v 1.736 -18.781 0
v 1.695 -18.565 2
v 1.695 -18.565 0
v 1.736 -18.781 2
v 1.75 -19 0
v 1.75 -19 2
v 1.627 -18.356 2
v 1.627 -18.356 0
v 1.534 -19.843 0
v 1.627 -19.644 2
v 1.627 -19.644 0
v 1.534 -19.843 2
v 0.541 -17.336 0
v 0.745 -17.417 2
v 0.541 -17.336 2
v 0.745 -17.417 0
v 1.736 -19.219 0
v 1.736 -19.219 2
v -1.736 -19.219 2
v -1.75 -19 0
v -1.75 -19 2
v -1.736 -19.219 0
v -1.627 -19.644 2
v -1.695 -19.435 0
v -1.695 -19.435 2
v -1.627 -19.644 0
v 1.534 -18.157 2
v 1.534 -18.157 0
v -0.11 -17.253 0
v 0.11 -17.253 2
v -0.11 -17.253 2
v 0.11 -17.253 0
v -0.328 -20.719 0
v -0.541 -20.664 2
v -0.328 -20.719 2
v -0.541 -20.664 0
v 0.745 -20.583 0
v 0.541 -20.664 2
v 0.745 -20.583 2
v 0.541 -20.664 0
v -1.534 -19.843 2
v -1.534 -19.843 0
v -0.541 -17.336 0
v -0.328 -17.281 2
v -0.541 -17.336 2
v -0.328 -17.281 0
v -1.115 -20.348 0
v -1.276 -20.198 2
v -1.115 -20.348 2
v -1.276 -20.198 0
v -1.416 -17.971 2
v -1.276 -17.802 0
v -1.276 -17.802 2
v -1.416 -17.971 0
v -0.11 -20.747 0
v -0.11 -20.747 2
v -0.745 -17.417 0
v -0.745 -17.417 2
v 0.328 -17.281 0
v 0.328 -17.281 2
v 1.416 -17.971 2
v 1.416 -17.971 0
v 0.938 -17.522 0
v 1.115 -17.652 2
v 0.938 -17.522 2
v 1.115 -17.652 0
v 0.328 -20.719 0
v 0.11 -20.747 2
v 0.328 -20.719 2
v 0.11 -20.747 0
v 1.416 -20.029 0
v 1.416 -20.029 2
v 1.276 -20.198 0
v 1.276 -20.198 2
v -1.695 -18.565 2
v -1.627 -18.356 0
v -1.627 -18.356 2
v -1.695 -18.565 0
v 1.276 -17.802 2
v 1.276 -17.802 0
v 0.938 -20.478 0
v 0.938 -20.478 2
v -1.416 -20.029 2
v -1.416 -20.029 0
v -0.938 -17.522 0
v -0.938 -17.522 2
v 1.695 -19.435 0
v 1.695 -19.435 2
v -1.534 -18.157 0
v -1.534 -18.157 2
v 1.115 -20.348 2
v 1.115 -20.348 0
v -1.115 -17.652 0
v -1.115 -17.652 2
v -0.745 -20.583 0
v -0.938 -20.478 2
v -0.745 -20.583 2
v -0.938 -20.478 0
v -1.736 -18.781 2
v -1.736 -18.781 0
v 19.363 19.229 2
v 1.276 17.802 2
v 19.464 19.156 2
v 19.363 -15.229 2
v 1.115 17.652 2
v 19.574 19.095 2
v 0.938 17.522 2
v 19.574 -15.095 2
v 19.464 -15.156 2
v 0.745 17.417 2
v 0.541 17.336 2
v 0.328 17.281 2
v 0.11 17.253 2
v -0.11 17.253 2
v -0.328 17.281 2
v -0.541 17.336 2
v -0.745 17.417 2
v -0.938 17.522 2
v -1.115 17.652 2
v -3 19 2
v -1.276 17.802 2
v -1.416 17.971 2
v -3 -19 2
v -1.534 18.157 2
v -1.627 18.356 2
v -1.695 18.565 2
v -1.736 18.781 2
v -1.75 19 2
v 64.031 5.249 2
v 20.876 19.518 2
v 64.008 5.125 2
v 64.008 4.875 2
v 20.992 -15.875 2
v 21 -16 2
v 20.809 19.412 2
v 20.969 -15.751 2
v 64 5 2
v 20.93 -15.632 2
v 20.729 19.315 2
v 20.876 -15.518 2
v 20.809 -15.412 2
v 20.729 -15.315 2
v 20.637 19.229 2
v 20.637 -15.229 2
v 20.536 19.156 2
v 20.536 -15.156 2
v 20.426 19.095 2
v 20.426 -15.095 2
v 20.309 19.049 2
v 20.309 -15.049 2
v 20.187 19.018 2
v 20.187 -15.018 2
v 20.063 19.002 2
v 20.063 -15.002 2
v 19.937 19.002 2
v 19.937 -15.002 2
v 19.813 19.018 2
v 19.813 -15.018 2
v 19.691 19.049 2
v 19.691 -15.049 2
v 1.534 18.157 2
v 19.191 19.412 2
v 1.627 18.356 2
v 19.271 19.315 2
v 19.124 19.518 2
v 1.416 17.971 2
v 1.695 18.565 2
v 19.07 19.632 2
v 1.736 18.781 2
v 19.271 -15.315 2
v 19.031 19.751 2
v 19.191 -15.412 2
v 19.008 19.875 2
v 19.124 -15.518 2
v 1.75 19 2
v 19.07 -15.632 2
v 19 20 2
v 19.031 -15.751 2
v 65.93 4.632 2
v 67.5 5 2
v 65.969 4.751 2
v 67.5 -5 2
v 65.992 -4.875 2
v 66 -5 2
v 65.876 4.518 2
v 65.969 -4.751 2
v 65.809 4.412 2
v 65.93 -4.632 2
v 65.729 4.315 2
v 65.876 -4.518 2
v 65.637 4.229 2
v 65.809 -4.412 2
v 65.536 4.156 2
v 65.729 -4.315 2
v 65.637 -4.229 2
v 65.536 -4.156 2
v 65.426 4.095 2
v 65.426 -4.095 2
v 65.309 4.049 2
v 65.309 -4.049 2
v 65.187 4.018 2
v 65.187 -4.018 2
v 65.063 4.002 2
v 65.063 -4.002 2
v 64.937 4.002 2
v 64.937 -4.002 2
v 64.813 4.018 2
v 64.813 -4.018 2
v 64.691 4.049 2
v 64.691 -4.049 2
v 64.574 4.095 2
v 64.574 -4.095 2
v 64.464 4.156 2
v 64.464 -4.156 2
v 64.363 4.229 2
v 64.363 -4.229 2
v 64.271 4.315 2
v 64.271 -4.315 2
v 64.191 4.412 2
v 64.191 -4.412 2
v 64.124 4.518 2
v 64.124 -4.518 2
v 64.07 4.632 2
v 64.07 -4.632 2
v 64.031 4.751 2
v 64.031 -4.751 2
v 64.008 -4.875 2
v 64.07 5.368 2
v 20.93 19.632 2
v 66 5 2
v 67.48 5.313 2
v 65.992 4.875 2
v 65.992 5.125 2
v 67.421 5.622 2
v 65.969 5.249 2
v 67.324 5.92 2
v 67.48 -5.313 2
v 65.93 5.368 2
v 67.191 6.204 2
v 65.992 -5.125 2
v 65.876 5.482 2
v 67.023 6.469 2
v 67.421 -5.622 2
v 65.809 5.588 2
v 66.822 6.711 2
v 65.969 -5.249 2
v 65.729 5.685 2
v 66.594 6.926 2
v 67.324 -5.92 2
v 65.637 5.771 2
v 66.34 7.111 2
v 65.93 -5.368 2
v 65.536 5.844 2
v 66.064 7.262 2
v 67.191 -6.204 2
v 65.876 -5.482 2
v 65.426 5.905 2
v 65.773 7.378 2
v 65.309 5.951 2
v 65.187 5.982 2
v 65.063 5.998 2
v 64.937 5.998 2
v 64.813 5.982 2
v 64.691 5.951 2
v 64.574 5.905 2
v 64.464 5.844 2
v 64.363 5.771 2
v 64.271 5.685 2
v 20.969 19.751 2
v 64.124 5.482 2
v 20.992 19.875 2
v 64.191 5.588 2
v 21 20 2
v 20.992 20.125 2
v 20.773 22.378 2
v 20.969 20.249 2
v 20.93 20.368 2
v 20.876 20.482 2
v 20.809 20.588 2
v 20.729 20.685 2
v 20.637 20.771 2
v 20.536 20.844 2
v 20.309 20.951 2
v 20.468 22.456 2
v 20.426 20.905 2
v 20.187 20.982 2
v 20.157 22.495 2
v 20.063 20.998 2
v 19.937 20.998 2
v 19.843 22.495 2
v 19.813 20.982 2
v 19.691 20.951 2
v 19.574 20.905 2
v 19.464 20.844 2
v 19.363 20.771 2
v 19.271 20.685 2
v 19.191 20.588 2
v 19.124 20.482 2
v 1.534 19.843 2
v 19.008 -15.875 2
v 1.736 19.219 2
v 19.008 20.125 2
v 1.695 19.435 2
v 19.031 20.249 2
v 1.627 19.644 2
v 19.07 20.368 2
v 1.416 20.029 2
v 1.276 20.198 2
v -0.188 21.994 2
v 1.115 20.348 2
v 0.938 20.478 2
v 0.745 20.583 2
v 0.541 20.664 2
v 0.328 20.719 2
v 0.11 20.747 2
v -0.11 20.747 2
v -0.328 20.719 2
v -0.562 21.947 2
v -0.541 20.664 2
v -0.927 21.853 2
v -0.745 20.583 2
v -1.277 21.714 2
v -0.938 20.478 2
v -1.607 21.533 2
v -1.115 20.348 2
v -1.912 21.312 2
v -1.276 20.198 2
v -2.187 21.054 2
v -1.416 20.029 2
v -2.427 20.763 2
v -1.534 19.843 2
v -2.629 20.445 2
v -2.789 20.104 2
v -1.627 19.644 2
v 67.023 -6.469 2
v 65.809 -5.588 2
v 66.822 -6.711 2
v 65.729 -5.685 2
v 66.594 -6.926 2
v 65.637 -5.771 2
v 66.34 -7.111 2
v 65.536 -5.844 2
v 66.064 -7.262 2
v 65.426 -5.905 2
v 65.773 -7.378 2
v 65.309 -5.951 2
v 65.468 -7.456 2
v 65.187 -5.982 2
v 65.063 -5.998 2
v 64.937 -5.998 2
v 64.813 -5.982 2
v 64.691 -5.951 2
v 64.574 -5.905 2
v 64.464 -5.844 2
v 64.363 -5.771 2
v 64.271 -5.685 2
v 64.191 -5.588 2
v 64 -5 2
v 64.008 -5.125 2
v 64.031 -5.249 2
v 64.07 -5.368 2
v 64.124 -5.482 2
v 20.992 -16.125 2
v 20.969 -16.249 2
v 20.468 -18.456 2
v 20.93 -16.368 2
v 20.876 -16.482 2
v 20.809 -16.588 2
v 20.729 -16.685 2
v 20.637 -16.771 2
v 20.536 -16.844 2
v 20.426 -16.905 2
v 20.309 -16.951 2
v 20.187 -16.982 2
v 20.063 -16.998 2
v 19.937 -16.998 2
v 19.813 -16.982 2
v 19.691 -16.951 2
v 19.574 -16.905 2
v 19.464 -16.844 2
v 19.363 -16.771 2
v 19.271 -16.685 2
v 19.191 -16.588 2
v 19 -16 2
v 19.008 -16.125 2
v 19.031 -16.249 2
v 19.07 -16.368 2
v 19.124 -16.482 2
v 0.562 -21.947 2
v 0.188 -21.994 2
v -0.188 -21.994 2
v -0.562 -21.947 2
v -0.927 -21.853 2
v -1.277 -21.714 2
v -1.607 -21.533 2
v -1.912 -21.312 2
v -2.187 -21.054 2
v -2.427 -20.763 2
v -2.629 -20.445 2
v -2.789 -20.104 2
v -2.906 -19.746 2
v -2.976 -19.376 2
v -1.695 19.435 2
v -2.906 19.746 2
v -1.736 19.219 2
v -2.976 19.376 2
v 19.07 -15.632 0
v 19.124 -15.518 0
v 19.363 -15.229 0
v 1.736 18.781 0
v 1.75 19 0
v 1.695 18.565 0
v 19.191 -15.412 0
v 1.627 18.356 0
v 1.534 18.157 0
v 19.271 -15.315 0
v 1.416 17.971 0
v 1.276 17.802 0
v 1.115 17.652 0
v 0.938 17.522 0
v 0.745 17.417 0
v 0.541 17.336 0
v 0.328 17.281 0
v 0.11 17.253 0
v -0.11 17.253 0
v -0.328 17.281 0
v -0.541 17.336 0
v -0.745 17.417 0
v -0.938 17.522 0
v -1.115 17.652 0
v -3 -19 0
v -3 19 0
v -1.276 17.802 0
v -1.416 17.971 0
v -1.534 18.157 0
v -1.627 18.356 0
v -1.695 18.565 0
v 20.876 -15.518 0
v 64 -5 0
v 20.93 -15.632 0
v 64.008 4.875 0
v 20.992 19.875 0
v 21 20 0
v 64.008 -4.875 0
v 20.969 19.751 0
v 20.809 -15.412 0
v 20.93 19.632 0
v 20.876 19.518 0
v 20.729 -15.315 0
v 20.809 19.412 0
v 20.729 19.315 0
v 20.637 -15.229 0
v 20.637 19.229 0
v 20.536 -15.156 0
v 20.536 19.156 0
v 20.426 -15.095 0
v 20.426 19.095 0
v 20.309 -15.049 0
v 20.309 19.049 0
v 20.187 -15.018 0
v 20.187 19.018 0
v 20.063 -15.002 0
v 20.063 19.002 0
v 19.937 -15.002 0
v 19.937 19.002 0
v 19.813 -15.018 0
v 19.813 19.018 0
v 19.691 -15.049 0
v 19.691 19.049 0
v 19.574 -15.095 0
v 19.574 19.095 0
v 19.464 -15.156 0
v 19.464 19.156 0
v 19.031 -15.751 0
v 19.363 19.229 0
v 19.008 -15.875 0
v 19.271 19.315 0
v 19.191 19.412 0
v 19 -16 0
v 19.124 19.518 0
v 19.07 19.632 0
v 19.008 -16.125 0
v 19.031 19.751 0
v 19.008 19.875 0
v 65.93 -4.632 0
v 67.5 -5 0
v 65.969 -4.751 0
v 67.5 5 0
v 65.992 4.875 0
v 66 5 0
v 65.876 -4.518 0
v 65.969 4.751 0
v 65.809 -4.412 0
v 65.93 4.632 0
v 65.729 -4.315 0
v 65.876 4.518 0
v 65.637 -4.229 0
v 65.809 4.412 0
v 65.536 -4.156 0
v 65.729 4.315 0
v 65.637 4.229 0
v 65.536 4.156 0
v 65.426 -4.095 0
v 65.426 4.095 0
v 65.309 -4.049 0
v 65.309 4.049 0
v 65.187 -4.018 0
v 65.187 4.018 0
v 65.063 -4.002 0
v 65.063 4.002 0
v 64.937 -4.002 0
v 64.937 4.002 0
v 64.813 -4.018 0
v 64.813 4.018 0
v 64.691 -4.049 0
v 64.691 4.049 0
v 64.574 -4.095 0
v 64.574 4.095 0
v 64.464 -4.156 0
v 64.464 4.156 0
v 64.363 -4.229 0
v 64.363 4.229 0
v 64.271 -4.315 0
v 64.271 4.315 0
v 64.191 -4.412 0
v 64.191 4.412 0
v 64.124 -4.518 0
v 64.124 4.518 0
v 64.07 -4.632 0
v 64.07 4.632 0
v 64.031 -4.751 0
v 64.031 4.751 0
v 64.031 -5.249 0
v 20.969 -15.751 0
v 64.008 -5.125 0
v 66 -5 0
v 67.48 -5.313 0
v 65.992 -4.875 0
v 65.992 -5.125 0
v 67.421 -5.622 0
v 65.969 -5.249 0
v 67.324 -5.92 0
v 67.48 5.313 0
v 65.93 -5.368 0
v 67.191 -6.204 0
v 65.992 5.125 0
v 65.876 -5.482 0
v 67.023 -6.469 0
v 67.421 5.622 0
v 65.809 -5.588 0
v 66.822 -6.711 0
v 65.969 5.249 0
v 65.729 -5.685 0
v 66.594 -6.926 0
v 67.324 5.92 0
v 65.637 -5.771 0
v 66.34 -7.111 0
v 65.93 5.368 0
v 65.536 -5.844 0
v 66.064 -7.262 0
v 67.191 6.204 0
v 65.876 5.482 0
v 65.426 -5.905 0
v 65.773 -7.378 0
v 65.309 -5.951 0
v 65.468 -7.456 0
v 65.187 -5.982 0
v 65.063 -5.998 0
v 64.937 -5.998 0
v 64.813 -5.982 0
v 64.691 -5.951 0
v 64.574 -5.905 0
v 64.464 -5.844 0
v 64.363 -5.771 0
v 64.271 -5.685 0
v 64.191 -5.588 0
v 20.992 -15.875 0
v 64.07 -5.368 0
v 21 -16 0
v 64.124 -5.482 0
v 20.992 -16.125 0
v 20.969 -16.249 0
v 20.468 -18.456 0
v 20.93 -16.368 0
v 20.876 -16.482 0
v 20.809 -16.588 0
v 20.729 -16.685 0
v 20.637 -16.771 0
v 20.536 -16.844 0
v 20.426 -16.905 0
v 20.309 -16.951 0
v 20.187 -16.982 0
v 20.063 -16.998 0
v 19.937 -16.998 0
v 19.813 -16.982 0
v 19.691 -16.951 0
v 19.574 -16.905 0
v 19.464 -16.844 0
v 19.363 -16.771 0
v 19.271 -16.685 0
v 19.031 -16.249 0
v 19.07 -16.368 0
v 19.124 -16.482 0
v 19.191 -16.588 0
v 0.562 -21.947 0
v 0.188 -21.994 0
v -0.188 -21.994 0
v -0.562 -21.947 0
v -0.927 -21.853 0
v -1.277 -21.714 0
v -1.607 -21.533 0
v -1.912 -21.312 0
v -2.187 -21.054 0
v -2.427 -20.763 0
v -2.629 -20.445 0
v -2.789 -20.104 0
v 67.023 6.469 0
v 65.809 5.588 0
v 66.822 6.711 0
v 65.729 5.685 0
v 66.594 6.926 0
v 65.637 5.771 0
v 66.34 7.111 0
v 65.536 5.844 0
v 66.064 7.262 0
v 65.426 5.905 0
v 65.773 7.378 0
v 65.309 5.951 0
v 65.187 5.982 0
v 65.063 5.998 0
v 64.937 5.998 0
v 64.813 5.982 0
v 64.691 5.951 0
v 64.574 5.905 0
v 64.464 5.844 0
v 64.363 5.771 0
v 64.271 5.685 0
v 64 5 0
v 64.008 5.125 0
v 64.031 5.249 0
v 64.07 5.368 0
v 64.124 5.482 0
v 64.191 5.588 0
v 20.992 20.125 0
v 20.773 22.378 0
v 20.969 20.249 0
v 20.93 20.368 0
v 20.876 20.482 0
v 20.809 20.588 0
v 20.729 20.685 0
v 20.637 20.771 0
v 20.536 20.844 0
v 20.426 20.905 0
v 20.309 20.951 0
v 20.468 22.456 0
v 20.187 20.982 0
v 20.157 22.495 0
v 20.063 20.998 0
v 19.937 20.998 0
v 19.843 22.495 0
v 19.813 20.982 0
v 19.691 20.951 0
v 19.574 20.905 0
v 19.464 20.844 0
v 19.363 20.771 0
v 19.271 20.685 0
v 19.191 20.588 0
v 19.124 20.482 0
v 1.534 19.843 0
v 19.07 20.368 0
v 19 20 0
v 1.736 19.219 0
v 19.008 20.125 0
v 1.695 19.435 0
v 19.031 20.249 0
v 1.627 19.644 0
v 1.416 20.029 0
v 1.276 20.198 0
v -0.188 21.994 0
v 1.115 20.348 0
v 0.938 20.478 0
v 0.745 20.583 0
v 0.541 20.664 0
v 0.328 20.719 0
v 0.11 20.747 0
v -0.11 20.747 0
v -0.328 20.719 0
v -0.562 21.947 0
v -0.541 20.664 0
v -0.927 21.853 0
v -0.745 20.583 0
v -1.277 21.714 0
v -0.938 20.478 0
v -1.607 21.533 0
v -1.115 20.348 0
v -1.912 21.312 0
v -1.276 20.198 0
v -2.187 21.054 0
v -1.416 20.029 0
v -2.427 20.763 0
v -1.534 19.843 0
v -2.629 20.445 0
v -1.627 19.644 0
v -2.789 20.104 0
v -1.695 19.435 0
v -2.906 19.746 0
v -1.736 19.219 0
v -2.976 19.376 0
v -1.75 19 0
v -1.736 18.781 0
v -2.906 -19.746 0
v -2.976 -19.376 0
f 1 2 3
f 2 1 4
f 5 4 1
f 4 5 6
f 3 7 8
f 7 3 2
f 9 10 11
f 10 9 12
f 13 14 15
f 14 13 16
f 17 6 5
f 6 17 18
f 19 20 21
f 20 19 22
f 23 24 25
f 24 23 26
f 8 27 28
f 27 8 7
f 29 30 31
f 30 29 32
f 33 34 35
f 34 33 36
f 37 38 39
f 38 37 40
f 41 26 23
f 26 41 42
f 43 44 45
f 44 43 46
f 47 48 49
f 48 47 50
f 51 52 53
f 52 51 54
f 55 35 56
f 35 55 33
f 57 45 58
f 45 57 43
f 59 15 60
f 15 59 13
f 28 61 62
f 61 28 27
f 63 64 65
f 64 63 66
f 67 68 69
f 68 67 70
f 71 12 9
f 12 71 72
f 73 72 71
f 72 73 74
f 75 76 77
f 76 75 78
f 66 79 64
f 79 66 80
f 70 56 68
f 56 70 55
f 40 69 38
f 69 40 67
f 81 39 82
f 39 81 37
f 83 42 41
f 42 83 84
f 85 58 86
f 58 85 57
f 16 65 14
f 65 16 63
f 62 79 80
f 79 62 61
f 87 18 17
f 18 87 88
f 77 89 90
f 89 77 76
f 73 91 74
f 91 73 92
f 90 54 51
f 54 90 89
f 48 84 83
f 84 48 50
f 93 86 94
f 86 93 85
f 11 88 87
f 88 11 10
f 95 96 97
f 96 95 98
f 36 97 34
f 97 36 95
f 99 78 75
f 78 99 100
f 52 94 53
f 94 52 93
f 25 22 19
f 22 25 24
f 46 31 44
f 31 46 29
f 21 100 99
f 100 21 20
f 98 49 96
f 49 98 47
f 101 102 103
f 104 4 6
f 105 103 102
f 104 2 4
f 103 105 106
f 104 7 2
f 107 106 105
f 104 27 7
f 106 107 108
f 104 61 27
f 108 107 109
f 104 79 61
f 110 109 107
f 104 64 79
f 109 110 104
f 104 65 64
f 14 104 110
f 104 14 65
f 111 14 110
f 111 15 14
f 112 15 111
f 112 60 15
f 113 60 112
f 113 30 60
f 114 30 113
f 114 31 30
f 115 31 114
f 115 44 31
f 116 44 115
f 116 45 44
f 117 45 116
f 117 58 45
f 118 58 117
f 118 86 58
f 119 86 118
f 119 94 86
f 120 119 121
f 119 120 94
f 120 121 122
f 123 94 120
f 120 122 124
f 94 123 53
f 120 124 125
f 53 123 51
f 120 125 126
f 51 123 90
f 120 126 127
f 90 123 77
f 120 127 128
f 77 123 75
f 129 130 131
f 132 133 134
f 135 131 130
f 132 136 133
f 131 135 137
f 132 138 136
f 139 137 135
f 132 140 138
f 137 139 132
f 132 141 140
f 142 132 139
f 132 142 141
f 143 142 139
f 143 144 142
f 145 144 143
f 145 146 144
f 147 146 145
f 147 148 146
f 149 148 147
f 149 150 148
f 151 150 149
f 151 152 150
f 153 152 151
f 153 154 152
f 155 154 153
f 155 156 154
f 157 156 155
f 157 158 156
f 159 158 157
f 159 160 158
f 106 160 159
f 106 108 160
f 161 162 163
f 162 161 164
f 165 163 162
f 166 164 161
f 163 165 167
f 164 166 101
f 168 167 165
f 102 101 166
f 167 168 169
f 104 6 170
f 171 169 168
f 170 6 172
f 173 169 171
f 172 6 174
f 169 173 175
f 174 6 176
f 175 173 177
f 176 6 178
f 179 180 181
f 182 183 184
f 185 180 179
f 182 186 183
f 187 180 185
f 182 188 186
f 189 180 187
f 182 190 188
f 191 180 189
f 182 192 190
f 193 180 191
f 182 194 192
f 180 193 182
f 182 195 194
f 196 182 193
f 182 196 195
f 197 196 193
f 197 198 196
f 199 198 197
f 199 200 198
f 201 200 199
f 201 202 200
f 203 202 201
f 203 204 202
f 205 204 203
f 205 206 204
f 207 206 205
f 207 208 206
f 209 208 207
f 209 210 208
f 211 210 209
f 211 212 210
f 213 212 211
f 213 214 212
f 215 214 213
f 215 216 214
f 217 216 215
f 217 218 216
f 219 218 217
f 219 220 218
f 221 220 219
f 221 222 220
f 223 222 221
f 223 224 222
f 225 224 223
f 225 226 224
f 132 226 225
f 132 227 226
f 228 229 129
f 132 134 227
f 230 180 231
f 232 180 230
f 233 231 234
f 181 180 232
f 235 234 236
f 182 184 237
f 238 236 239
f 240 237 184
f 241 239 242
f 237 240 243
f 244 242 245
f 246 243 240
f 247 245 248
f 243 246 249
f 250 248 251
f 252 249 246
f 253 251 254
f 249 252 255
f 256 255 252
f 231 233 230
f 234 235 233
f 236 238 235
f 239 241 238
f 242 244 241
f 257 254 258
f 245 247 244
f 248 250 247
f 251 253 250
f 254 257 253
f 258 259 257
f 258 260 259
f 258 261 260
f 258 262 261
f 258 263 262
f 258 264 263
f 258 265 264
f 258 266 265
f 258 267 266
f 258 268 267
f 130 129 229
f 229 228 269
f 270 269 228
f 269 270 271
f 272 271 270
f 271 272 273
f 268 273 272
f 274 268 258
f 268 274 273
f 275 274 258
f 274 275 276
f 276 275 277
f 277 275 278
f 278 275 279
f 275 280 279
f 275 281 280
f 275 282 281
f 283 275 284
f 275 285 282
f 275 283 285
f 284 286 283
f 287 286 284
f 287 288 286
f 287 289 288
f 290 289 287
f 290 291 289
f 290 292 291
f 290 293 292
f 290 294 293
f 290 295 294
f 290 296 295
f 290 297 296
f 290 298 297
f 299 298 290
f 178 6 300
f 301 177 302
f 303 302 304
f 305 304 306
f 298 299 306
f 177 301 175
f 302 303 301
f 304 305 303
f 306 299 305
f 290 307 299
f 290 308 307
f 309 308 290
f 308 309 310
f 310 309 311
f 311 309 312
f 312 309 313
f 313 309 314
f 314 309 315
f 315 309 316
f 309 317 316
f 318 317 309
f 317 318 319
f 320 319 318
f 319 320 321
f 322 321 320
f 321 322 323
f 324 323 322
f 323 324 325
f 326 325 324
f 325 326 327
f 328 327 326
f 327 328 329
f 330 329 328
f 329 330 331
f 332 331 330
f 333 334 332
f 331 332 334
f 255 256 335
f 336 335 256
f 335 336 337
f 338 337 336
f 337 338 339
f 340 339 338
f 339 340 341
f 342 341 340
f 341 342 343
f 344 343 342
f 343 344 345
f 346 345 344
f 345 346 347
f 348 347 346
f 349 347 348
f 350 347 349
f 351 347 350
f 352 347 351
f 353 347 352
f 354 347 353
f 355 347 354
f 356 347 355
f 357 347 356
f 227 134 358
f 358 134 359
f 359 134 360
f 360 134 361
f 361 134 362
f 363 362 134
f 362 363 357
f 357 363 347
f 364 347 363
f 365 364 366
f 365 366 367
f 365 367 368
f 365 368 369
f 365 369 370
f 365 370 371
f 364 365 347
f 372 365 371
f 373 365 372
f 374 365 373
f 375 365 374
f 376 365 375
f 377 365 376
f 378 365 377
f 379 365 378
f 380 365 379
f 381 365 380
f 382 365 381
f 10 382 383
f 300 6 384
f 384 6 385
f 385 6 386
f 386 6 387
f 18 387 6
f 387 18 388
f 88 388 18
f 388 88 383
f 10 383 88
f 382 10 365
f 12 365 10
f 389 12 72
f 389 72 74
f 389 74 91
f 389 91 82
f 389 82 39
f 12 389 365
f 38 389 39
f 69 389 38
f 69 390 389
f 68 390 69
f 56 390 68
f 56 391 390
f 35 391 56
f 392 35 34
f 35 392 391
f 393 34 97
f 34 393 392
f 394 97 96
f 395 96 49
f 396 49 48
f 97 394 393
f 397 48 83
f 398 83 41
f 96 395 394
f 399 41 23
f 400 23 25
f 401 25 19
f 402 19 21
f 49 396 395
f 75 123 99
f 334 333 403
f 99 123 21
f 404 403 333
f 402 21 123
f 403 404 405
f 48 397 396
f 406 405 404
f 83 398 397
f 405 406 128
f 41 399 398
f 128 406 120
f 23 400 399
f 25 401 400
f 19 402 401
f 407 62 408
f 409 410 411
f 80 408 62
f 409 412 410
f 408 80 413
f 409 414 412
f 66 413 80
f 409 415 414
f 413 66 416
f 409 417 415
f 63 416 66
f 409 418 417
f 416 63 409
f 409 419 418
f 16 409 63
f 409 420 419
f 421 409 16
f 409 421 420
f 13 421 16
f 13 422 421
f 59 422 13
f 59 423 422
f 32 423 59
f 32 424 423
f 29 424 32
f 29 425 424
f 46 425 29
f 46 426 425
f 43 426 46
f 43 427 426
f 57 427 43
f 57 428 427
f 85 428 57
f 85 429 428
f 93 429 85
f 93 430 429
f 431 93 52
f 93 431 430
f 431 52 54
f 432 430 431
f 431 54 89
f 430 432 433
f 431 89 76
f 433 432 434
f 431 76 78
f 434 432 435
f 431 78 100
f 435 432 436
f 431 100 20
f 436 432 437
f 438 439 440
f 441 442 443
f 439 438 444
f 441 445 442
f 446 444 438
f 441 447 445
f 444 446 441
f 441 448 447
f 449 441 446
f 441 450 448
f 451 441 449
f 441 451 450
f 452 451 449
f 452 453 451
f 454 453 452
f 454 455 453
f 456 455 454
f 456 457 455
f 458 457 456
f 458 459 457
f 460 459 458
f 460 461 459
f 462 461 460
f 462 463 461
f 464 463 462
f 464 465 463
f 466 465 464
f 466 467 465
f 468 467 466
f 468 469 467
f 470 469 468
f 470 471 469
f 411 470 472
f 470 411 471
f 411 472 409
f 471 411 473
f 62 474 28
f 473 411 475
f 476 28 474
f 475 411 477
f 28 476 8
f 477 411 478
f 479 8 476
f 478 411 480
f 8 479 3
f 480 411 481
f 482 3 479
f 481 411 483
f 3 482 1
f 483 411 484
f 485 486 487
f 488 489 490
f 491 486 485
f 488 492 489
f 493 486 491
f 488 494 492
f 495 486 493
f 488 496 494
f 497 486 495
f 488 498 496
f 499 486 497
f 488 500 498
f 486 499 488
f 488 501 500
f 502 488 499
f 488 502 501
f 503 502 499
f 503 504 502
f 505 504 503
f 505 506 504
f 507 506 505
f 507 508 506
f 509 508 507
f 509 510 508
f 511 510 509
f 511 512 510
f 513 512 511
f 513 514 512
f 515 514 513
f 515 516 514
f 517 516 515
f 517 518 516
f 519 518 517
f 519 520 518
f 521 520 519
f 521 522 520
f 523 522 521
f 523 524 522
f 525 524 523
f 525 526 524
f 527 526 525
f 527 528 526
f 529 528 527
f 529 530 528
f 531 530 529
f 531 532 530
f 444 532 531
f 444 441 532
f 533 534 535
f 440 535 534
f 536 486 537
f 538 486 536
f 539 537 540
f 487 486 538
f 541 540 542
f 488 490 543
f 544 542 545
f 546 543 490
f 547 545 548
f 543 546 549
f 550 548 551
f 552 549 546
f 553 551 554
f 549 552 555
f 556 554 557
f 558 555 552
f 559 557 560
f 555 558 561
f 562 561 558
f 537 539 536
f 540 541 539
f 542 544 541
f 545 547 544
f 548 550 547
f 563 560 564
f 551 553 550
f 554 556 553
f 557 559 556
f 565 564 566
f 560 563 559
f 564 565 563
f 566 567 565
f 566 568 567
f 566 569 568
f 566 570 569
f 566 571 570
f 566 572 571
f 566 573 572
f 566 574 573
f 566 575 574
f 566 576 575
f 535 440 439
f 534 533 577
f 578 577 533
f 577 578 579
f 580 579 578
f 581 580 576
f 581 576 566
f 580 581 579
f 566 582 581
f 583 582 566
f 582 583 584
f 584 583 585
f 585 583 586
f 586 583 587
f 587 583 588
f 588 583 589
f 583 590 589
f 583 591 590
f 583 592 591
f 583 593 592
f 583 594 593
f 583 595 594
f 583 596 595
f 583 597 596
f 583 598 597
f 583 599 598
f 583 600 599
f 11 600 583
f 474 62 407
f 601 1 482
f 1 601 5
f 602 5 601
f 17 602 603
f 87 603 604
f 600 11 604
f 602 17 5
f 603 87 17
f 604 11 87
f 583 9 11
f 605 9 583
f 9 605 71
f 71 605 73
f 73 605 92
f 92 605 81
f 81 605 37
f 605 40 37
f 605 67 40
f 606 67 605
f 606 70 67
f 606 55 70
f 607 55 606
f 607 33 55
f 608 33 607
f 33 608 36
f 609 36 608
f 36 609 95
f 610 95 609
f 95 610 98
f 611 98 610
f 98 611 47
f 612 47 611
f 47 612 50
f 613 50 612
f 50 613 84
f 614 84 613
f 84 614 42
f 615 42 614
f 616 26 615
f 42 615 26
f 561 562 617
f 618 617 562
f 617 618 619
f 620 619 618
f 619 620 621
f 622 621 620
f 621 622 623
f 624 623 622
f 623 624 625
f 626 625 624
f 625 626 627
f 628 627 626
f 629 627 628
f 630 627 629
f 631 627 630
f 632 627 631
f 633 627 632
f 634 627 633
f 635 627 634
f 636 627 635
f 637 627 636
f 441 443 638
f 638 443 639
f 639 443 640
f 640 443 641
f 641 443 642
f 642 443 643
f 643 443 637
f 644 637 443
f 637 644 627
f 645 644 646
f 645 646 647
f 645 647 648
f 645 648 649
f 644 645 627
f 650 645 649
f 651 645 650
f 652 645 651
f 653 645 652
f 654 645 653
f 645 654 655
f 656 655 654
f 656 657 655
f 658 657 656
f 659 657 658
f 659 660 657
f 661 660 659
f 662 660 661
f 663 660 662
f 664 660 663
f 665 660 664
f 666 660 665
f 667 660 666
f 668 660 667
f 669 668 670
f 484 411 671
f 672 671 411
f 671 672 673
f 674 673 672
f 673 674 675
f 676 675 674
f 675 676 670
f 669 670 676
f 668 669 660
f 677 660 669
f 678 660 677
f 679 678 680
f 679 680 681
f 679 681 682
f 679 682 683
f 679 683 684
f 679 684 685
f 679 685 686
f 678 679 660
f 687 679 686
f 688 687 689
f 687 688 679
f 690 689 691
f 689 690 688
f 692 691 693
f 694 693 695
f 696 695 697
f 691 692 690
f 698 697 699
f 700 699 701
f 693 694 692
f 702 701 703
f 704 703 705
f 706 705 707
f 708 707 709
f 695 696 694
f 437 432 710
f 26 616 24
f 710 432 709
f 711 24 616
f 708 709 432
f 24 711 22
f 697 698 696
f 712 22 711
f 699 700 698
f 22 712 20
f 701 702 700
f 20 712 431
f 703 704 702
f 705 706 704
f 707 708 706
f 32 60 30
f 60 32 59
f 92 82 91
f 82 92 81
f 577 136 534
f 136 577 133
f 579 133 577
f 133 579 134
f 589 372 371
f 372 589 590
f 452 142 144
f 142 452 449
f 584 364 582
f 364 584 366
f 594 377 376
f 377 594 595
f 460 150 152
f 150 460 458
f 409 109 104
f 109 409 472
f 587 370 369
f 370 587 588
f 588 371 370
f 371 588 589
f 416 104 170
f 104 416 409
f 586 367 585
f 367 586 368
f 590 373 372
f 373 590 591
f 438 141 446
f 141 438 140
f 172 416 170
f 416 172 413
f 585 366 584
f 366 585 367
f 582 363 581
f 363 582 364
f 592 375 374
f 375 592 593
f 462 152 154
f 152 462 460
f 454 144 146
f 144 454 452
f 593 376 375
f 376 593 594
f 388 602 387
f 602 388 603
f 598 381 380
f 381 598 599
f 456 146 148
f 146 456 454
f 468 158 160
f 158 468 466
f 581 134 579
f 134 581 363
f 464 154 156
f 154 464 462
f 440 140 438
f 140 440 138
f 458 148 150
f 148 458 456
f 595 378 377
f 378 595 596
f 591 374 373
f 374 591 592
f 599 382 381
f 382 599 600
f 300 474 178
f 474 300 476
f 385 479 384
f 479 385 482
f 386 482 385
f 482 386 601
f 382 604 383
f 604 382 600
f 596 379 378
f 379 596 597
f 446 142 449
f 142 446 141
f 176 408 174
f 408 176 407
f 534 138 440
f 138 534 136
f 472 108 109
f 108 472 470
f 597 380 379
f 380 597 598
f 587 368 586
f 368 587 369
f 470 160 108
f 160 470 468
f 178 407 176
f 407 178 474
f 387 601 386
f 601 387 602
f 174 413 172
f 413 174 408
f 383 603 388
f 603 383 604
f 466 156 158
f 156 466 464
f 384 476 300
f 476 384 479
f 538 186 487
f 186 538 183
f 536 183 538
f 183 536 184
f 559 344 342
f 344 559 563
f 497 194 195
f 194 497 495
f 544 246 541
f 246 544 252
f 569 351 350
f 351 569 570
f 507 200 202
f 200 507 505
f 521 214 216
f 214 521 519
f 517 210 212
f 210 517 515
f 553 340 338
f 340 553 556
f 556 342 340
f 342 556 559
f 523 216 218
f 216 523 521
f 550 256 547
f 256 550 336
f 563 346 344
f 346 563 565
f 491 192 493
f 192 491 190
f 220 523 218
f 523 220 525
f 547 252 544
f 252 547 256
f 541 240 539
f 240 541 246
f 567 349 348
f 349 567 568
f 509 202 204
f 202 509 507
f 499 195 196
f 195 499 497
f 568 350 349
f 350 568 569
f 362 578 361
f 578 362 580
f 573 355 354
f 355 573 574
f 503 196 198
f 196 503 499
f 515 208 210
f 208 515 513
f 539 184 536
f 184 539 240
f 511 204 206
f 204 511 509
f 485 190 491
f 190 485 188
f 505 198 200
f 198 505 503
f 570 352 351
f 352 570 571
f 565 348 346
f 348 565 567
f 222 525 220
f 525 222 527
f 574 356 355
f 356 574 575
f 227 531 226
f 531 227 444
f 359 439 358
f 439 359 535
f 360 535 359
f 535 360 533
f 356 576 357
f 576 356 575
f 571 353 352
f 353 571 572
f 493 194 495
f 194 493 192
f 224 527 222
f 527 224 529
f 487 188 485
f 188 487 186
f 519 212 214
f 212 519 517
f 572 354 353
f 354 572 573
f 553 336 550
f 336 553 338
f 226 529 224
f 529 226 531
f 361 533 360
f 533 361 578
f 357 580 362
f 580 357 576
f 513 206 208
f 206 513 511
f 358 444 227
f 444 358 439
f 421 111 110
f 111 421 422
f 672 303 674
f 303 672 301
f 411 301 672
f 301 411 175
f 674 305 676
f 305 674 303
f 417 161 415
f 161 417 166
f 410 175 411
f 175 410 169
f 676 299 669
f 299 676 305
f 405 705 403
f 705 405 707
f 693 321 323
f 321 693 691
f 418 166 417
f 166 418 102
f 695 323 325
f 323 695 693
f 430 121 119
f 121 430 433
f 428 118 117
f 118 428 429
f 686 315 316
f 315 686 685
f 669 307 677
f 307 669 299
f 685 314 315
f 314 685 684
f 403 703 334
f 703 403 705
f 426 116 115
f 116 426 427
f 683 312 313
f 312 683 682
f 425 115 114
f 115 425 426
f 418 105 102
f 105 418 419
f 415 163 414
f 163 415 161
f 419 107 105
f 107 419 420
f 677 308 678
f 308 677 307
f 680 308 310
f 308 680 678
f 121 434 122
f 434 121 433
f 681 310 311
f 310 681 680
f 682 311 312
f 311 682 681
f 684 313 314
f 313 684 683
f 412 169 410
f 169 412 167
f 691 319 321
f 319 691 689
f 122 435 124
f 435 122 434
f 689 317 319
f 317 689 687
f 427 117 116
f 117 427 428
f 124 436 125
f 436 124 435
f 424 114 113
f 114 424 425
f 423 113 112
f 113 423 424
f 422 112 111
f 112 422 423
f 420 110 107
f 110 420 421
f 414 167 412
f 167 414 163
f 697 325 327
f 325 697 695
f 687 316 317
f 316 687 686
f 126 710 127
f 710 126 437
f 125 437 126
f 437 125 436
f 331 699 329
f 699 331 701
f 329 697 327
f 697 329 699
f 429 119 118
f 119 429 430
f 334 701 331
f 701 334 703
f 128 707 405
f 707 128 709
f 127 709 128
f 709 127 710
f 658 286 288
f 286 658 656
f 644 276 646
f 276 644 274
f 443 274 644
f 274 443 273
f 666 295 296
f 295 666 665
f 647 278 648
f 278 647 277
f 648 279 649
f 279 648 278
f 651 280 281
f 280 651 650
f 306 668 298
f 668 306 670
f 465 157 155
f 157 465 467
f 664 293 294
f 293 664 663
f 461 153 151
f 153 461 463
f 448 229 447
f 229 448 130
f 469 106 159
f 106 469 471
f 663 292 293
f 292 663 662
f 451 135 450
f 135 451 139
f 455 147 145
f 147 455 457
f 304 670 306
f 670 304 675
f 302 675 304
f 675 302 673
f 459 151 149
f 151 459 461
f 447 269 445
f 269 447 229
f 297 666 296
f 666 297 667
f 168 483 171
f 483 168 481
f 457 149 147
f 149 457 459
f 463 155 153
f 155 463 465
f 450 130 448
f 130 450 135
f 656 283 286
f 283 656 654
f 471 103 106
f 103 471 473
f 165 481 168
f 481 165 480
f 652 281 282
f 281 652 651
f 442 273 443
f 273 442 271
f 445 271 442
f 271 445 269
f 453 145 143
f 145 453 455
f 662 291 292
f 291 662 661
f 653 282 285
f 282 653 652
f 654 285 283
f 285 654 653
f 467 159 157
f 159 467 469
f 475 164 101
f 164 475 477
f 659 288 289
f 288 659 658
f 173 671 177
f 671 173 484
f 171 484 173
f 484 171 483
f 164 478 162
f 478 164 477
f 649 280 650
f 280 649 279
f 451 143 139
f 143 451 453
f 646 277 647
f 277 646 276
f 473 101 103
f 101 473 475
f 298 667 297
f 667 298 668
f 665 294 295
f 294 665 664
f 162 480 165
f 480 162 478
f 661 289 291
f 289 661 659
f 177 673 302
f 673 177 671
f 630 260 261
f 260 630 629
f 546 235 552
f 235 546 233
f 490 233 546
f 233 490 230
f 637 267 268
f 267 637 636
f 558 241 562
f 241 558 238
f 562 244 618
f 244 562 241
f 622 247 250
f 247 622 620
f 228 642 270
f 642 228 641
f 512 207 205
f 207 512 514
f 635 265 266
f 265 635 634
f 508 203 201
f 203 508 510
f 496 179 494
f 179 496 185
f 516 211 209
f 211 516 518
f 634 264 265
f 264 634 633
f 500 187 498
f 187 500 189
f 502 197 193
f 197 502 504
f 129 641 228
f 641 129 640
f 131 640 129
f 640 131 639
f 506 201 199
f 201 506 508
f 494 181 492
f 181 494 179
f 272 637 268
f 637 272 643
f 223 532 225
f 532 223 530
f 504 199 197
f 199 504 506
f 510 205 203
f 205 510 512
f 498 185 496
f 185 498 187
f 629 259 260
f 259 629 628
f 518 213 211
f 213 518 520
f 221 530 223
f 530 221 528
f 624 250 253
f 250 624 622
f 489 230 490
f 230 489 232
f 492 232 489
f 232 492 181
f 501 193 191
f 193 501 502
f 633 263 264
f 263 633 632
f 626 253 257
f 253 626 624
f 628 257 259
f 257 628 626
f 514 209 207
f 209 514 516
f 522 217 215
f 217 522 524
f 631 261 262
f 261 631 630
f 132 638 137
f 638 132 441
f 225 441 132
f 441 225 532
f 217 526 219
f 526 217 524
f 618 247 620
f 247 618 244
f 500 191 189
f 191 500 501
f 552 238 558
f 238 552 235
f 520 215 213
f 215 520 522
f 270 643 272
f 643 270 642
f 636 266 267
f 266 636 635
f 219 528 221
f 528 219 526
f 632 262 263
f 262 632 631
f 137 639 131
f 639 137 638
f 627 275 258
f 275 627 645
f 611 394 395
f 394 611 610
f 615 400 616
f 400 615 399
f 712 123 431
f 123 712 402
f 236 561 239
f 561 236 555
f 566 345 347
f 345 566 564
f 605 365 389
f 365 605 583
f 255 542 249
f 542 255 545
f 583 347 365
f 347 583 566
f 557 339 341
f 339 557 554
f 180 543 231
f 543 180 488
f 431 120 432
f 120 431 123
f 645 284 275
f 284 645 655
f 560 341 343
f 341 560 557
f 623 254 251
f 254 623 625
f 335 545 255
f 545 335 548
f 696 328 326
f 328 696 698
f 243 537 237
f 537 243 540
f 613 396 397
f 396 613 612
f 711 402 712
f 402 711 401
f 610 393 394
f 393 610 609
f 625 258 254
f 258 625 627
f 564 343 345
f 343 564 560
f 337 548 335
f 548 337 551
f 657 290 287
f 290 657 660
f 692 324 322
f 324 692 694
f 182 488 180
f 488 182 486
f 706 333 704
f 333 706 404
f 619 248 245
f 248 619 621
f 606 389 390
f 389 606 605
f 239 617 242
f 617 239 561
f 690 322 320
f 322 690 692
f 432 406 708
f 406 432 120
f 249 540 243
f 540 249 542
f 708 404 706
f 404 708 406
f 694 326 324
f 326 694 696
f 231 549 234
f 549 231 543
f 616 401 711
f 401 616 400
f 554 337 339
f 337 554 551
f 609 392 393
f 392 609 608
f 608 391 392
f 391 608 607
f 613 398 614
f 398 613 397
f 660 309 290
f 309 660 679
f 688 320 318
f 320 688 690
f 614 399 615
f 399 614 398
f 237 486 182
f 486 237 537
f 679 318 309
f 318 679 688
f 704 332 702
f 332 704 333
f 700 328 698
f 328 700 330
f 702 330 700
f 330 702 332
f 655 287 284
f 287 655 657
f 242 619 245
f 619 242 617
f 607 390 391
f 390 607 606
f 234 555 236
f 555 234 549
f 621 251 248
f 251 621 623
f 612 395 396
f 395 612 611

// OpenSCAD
MOUNT_HOLE_SPACING = 36;
MOUNT_HOLE_DIA = 2;
MOUNT_HOLE_HEAD_DIA = 5;
MOUNT_HOLE_OFFSET_X = 20;
MOUNT_HOLE_OFFSET_Y = 2;

SHERPA_HOLE_DIA = 3.5;
SHERPA_HOLE_SPACING = 38;
SHERPA_HOLE_HEAD_DIA = 6;

STRAIN_RELIEF_WIDTH = 10;
STRAIN_RELIEF_LENGTH = 65;
STRAIN_RELIEF_DIA = 5;
STRAIN_RELIEF_HOLE_DIA = 2;

THICKNESS = 2;

$fn = 50;

module body() {
  hull() {
    for(i = [-1, 1]) {
      translate([0, i * SHERPA_HOLE_SPACING/2, 0])
      cylinder(d = SHERPA_HOLE_HEAD_DIA, h = THICKNESS);

      translate([MOUNT_HOLE_OFFSET_X, MOUNT_HOLE_OFFSET_Y + i * MOUNT_HOLE_SPACING/2, 0])
      cylinder(d = MOUNT_HOLE_HEAD_DIA, h = THICKNESS);

      translate([STRAIN_RELIEF_LENGTH, i * STRAIN_RELIEF_WIDTH/2, 0])
      cylinder(d = STRAIN_RELIEF_DIA, h = THICKNESS);
    }
  }
}

module holes() {
  for(i = [-1, 1]) {
    translate([0, i * SHERPA_HOLE_SPACING/2, 0])
    cylinder(d = SHERPA_HOLE_DIA, h = THICKNESS);

    translate([MOUNT_HOLE_OFFSET_X, MOUNT_HOLE_OFFSET_Y + i * MOUNT_HOLE_SPACING/2, 0])
    cylinder(d = MOUNT_HOLE_DIA, h = THICKNESS);

    translate([STRAIN_RELIEF_LENGTH, i * STRAIN_RELIEF_WIDTH/2, 0])
    cylinder(d = STRAIN_RELIEF_HOLE_DIA, h = THICKNESS);
  }
}

difference() {
  body();
  #holes();
}
